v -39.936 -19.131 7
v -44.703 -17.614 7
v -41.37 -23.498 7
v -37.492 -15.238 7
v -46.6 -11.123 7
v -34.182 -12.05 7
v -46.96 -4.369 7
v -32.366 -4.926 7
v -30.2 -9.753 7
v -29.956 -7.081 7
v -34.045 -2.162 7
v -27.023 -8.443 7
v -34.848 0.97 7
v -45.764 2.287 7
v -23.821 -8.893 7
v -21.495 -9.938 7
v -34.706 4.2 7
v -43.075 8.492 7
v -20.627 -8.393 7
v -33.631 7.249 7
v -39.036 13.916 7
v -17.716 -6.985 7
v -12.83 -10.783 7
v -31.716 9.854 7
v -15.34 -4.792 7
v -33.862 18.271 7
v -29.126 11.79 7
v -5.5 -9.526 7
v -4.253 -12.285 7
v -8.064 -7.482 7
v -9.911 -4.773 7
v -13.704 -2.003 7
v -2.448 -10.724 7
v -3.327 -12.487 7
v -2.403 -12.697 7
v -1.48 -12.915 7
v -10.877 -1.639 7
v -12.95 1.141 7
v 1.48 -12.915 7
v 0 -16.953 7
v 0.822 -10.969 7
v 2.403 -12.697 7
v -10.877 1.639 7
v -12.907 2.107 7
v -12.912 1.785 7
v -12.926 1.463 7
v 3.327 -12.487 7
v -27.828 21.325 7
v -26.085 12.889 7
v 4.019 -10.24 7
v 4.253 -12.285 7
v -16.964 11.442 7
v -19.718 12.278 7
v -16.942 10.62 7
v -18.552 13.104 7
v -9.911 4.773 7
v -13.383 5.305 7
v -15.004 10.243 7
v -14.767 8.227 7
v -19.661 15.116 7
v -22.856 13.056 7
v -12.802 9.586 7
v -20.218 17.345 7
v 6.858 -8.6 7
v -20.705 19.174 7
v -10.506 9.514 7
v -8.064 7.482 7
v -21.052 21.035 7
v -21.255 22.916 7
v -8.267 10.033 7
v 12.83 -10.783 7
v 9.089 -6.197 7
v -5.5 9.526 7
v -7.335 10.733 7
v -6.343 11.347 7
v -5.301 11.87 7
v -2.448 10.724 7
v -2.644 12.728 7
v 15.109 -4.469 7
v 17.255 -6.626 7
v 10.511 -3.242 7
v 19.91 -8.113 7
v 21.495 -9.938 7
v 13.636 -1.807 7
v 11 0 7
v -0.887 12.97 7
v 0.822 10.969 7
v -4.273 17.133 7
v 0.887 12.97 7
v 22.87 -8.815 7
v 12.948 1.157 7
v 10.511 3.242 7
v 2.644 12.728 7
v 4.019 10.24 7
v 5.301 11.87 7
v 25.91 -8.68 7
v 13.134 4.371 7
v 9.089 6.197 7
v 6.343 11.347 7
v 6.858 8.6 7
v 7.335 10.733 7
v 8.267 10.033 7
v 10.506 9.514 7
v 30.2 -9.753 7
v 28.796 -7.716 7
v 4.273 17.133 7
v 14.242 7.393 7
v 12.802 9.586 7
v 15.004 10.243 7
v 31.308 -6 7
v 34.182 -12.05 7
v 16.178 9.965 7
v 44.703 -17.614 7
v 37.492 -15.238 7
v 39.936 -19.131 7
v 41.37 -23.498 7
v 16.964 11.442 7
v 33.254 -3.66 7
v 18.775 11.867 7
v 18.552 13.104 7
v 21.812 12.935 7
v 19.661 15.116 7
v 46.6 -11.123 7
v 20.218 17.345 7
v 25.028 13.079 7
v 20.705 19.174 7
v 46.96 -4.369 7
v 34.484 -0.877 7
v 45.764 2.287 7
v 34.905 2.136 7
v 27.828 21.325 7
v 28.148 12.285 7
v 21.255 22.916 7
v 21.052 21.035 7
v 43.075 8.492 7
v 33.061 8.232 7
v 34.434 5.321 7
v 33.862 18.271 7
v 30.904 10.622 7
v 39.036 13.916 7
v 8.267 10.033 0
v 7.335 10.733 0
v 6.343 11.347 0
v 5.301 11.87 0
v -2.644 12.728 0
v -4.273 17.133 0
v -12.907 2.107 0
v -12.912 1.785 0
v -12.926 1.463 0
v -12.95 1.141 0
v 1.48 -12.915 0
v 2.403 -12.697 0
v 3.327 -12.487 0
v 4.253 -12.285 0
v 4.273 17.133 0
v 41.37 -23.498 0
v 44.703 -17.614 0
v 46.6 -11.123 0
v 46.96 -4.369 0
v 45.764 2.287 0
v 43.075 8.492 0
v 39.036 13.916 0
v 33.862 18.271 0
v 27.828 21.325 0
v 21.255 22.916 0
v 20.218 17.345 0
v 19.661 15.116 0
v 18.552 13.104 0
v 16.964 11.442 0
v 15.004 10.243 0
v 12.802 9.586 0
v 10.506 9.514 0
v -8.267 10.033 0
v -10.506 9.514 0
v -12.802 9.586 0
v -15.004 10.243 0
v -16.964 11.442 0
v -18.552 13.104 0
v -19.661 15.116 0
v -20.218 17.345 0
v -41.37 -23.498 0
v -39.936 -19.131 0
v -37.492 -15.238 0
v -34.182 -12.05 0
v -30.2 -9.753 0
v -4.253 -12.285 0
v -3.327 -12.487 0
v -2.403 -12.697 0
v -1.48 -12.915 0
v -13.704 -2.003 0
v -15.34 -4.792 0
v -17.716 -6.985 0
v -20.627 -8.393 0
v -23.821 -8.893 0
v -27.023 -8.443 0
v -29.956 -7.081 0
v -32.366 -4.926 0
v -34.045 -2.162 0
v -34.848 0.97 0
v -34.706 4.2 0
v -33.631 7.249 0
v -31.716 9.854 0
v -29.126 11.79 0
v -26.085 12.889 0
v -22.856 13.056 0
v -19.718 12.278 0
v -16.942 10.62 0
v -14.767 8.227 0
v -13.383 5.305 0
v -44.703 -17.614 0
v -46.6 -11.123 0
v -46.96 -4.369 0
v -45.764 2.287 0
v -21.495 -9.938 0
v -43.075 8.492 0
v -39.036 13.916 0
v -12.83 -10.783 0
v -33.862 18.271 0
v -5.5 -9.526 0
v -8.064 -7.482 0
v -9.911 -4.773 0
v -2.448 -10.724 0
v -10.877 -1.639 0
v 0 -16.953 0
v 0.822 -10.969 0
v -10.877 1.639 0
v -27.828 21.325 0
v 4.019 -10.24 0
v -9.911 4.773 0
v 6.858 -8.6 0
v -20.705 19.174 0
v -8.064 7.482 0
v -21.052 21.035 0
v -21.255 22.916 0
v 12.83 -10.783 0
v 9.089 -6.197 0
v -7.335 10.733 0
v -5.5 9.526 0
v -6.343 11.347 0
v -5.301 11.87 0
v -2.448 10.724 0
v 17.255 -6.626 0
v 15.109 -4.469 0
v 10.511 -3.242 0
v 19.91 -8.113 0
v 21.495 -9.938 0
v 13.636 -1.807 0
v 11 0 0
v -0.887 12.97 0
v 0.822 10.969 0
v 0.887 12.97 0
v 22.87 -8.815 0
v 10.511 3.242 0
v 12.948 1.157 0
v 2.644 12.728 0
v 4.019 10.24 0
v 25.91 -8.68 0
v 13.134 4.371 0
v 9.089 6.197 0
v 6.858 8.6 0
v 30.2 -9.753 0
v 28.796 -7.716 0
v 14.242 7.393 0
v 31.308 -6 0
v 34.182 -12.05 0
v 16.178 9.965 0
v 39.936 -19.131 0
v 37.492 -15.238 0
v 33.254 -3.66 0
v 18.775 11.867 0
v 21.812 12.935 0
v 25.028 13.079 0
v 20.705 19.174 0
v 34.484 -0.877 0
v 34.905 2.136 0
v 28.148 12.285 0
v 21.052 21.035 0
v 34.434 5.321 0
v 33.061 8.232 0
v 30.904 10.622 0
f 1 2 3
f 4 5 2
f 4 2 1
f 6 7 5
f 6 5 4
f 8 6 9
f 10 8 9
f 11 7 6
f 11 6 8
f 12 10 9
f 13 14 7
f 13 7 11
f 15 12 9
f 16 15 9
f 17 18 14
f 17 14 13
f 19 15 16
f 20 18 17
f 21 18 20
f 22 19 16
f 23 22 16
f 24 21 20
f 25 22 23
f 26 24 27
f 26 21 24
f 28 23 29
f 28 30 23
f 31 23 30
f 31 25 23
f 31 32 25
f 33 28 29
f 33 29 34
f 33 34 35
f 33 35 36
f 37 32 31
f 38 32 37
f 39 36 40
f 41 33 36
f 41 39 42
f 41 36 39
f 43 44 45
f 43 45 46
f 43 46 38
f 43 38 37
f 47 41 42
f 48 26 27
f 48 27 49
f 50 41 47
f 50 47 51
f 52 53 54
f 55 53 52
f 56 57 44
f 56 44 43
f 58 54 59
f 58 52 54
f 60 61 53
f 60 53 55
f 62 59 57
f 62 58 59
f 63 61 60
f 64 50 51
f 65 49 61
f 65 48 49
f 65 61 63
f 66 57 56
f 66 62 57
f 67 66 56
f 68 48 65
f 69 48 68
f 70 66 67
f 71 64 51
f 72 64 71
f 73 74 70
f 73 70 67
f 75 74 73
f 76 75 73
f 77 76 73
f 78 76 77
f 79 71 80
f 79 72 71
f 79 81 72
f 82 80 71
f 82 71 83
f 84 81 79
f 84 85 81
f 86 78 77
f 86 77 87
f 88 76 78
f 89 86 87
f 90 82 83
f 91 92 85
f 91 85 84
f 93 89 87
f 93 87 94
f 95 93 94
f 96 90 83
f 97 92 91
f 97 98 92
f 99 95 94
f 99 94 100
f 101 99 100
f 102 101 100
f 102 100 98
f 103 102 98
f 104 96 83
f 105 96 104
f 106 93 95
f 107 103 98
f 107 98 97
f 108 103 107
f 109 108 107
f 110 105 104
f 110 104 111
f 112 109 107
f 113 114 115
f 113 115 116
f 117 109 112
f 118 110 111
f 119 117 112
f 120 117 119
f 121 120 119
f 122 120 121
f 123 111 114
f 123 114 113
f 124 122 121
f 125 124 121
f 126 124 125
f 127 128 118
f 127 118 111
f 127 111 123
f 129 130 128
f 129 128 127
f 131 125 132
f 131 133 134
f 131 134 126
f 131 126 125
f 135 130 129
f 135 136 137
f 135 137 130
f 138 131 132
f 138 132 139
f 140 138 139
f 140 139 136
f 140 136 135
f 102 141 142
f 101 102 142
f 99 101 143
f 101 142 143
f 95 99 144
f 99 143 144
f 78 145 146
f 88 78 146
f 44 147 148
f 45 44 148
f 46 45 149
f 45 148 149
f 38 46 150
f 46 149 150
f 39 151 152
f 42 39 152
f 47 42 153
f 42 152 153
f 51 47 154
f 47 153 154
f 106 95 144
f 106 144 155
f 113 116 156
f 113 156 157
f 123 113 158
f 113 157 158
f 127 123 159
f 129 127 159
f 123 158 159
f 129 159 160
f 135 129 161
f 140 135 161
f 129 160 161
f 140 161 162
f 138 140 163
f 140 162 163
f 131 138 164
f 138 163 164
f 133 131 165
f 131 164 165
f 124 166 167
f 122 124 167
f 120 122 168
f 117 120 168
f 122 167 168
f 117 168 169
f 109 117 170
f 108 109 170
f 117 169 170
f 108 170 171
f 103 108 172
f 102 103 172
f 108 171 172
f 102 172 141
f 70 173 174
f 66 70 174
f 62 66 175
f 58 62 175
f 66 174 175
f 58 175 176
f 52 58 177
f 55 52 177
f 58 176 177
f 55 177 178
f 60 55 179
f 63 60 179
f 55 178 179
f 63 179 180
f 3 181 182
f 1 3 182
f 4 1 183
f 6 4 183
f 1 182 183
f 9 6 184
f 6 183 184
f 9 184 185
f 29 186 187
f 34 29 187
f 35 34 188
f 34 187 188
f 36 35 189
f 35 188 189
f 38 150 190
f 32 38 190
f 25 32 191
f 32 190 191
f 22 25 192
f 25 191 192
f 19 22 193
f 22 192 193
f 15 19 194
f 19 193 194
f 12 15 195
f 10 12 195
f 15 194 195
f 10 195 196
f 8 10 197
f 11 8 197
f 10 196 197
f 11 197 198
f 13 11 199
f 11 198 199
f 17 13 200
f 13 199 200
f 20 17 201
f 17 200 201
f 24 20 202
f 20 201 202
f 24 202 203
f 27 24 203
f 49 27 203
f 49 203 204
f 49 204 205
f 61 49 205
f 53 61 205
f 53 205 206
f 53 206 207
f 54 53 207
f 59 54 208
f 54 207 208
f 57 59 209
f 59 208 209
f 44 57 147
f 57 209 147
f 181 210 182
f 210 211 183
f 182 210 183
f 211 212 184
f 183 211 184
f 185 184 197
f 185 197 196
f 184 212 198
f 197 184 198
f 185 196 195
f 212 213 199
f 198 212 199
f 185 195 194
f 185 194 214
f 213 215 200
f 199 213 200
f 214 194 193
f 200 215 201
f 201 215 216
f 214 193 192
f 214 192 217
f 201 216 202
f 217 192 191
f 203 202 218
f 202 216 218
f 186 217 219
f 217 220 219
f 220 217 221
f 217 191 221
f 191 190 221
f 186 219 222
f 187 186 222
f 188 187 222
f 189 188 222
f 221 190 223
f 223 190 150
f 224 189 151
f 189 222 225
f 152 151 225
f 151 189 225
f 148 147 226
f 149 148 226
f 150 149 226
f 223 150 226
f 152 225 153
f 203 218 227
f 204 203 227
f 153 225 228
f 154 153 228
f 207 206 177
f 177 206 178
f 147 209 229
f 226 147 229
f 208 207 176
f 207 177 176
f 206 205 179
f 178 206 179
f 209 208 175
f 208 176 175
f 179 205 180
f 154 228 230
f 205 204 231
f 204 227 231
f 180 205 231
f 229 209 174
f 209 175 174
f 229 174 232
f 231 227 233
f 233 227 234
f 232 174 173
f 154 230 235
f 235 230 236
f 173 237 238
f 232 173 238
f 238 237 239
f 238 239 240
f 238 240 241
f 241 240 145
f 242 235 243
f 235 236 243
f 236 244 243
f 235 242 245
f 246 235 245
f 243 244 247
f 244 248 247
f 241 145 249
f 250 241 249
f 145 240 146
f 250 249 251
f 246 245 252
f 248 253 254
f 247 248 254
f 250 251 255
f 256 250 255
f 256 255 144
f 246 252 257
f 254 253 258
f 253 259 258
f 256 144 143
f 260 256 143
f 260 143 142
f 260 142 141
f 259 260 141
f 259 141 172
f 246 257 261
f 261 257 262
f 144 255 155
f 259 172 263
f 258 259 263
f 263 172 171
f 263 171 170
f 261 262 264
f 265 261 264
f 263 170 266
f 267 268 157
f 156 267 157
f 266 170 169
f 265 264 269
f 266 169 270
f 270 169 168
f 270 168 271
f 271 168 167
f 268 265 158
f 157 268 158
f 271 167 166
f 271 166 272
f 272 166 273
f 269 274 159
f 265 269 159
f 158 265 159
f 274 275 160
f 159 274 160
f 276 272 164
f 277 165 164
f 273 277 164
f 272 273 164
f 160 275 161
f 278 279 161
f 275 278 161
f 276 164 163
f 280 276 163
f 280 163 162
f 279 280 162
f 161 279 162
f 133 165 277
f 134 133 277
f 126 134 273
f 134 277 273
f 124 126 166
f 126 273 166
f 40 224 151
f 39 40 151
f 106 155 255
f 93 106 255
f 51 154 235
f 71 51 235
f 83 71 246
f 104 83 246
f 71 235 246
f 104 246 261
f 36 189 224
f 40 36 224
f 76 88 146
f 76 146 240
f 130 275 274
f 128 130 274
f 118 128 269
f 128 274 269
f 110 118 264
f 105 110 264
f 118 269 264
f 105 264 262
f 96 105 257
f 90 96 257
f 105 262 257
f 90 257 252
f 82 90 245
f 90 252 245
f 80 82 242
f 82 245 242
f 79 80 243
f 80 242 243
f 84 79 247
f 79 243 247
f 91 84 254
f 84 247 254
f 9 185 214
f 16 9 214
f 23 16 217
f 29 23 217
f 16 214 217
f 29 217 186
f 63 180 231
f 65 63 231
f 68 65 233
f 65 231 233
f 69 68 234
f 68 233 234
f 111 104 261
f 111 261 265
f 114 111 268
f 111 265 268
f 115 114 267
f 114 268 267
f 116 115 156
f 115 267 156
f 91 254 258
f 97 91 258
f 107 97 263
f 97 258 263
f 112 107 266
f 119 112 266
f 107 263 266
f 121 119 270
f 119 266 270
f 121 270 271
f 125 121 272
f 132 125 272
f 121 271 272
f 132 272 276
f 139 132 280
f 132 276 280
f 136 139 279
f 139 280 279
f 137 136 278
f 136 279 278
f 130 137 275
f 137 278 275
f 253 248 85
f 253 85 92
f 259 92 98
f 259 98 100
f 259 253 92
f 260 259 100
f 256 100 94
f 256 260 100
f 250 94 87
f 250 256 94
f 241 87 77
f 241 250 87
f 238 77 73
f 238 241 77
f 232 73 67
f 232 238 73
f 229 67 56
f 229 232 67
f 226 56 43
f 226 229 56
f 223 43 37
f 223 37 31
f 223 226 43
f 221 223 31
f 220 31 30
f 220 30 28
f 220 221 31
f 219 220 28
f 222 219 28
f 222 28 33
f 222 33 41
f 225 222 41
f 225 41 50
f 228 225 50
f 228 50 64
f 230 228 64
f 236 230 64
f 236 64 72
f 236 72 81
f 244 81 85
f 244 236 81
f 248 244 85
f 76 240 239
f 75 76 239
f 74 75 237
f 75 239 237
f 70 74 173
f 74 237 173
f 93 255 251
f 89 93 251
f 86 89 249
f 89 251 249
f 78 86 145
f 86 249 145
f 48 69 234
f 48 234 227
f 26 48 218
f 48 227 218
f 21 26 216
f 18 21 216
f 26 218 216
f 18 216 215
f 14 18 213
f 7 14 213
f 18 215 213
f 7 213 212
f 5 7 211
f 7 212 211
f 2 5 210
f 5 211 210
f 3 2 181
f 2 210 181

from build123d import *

# Parameters (mm, degrees)
F0_R     = 11
F1_DEPTH = 7


# Not quite as in the source:
# - a feature names something its author has since deleted; it is built from what else it names


with BuildPart() as f1:
    # F0 (on Top) → F1 (new body)
    with BuildSketch(Plane.XY):
        with BuildLine():
            ThreePointArc((8.2670150988, 10.0327693762), (6.6928166447, 10.8047053779), (5.3005300857, 11.87031511))
            ThreePointArc((5.3005300857, 11.87031511), (3.9954022113, 12.3708027698), (2.6440826014, 12.7282688217))
            ThreePointArc((2.6440826014, 12.7282688217), (0, 13), (-2.6440826014, 12.7282688217))
            ThreePointArc((-2.6440826014, 12.7282688217), (-3.9954022113, 12.3708027698), (-5.3005300857, 11.87031511))
            ThreePointArc((-5.3005300857, 11.87031511), (-6.6928166447, 10.8047053779), (-8.2670150988, 10.0327693762))
            ThreePointArc((-8.2670150988, 10.0327693762), (-11.5023304401, 6.0577549014), (-12.9498157312, 1.1411715589))
            ThreePointArc((-12.9498157312, 1.1411715589), (-10.91097159, -7.0675808423), (-4.2533323097, -12.2845091177))
            ThreePointArc((-4.2533323097, -12.2845091177), (-2.8648005364, -12.5913760507), (-1.4801854989, -12.9154578273))
            ThreePointArc((-1.4801854989, -12.9154578273), (0, -13), (1.4801854989, -12.9154578273))
            ThreePointArc((1.4801854989, -12.9154578273), (2.8648005364, -12.5913760507), (4.2533323097, -12.2845091177))
            ThreePointArc((4.2533323097, -12.2845091177), (10.5899320117, -7.5401153829), (13, 0))
            ThreePointArc((13, 0), (12.9870943447, 0.5791204378), (12.9484030029, 1.1570910404))
            ThreePointArc((12.9484030029, 1.1570910404), (11.4986046018, 6.0648241699), (8.2670150988, 10.0327693762))
        make_face()
        Circle(F0_R, mode=Mode.SUBTRACT)
        with BuildLine():
            ThreePointArc((2.6440826014, 12.7282688217), (3.9954022113, 12.3708027698), (5.3005300857, 11.87031511))
            Line((5.3005300857, 11.87031511), (4.2731994612, 17.1326149936))
            Line((4.2731994612, 17.1326149936), (2.6440826014, 12.7282688217))
        make_face()
        with BuildLine():
            ThreePointArc((8.2670150988, 10.0327693762), (6.8457077183, 11.0515286651), (5.3005300857, 11.87031511))
            ThreePointArc((5.3005300857, 11.87031511), (6.6928166447, 10.8047053779), (8.2670150988, 10.0327693762))
        make_face()
        with BuildLine():
            ThreePointArc((20.2180479346, 17.345385846), (16.0230615621, 10.7791515778), (8.2670150988, 10.0327693762))
            ThreePointArc((8.2670150988, 10.0327693762), (11.4986046018, 6.0648241699), (12.9484030029, 1.1570910404))
            ThreePointArc((12.9484030029, 1.1570910404), (12.9870943447, 0.5791204378), (13, 0))
            ThreePointArc((13, 0), (10.5899320117, -7.5401153829), (4.2533323097, -12.2845091177))
            ThreePointArc((4.2533323097, -12.2845091177), (17.1543822867, -10.2782846696), (30.1999320971, -9.7532540138))
            ThreePointArc((30.1999320971, -9.7532540138), (37.492259841, -15.2381838585), (41.3699261844, -23.4980992973))
            ThreePointArc((41.3699261844, -23.4980992973), (44.5988308489, 5.4669473875), (21.2553682043, 22.9163744996))
            ThreePointArc((21.2553682043, 22.9163744996), (20.8964882238, 20.1011290455), (20.2180479346, 17.345385846))
        make_face()
        with BuildLine():
            ThreePointArc((34.9047439829, 2.1361683247), (24.3947690942, -8.8529114999), (12.9484030029, 1.1570910404))
            ThreePointArc((12.9484030029, 1.1570910404), (23.4147188717, 13.1252481492), (34.9047439829, 2.1361683247))
        make_face(mode=Mode.SUBTRACT)
        with BuildLine():
            ThreePointArc((-5.3005300857, 11.87031511), (-3.9954022113, 12.3708027698), (-2.6440826014, 12.7282688217))
            Line((-2.6440826014, 12.7282688217), (-4.2731994612, 17.1326149936))
            Line((-4.2731994612, 17.1326149936), (-5.3005300857, 11.87031511))
        make_face()
        with BuildLine():
            ThreePointArc((-8.2670150988, 10.0327693762), (-6.6928166447, 10.8047053779), (-5.3005300857, 11.87031511))
            ThreePointArc((-5.3005300857, 11.87031511), (-6.8457077183, 11.0515286651), (-8.2670150988, 10.0327693762))
        make_face()
        with BuildLine():
            ThreePointArc((-12.9498157312, 1.1411715589), (-11.5023304401, 6.0577549014), (-8.2670150988, 10.0327693762))
            ThreePointArc((-8.2670150988, 10.0327693762), (-16.0230615621, 10.7791515778), (-20.2180479346, 17.345385846))
            ThreePointArc((-20.2180479346, 17.345385846), (-20.8964882238, 20.1011290455), (-21.2553682043, 22.9163744996))
            ThreePointArc((-21.2553682043, 22.9163744996), (-44.5988308489, 5.4669473875), (-41.3699261844, -23.4980992973))
            ThreePointArc((-41.3699261844, -23.4980992973), (-37.492259841, -15.2381838585), (-30.1999320971, -9.7532540138))
            ThreePointArc((-30.1999320971, -9.7532540138), (-17.1543822867, -10.2782846696), (-4.2533323097, -12.2845091177))
            ThreePointArc((-4.2533323097, -12.2845091177), (-10.91097159, -7.0675808423), (-12.9498157312, 1.1411715589))
        make_face()
        with BuildLine():
            ThreePointArc((-12.9073521155, 2.1067783052), (-12.917973147, 1.6235083115), (-12.9498157312, 1.1411715589))
            ThreePointArc((-12.9498157312, 1.1411715589), (-34.896731084, 2.5900482989), (-12.9073521155, 2.1067783052))
        make_face(mode=Mode.SUBTRACT)
        with BuildLine():
            Line((0, -16.953125596), (1.4801854989, -12.9154578273))
            ThreePointArc((1.4801854989, -12.9154578273), (0, -13), (-1.4801854989, -12.9154578273))
            Line((-1.4801854989, -12.9154578273), (0, -16.953125596))
        make_face()
    extrude(amount=F1_DEPTH)


solid = f1.part
